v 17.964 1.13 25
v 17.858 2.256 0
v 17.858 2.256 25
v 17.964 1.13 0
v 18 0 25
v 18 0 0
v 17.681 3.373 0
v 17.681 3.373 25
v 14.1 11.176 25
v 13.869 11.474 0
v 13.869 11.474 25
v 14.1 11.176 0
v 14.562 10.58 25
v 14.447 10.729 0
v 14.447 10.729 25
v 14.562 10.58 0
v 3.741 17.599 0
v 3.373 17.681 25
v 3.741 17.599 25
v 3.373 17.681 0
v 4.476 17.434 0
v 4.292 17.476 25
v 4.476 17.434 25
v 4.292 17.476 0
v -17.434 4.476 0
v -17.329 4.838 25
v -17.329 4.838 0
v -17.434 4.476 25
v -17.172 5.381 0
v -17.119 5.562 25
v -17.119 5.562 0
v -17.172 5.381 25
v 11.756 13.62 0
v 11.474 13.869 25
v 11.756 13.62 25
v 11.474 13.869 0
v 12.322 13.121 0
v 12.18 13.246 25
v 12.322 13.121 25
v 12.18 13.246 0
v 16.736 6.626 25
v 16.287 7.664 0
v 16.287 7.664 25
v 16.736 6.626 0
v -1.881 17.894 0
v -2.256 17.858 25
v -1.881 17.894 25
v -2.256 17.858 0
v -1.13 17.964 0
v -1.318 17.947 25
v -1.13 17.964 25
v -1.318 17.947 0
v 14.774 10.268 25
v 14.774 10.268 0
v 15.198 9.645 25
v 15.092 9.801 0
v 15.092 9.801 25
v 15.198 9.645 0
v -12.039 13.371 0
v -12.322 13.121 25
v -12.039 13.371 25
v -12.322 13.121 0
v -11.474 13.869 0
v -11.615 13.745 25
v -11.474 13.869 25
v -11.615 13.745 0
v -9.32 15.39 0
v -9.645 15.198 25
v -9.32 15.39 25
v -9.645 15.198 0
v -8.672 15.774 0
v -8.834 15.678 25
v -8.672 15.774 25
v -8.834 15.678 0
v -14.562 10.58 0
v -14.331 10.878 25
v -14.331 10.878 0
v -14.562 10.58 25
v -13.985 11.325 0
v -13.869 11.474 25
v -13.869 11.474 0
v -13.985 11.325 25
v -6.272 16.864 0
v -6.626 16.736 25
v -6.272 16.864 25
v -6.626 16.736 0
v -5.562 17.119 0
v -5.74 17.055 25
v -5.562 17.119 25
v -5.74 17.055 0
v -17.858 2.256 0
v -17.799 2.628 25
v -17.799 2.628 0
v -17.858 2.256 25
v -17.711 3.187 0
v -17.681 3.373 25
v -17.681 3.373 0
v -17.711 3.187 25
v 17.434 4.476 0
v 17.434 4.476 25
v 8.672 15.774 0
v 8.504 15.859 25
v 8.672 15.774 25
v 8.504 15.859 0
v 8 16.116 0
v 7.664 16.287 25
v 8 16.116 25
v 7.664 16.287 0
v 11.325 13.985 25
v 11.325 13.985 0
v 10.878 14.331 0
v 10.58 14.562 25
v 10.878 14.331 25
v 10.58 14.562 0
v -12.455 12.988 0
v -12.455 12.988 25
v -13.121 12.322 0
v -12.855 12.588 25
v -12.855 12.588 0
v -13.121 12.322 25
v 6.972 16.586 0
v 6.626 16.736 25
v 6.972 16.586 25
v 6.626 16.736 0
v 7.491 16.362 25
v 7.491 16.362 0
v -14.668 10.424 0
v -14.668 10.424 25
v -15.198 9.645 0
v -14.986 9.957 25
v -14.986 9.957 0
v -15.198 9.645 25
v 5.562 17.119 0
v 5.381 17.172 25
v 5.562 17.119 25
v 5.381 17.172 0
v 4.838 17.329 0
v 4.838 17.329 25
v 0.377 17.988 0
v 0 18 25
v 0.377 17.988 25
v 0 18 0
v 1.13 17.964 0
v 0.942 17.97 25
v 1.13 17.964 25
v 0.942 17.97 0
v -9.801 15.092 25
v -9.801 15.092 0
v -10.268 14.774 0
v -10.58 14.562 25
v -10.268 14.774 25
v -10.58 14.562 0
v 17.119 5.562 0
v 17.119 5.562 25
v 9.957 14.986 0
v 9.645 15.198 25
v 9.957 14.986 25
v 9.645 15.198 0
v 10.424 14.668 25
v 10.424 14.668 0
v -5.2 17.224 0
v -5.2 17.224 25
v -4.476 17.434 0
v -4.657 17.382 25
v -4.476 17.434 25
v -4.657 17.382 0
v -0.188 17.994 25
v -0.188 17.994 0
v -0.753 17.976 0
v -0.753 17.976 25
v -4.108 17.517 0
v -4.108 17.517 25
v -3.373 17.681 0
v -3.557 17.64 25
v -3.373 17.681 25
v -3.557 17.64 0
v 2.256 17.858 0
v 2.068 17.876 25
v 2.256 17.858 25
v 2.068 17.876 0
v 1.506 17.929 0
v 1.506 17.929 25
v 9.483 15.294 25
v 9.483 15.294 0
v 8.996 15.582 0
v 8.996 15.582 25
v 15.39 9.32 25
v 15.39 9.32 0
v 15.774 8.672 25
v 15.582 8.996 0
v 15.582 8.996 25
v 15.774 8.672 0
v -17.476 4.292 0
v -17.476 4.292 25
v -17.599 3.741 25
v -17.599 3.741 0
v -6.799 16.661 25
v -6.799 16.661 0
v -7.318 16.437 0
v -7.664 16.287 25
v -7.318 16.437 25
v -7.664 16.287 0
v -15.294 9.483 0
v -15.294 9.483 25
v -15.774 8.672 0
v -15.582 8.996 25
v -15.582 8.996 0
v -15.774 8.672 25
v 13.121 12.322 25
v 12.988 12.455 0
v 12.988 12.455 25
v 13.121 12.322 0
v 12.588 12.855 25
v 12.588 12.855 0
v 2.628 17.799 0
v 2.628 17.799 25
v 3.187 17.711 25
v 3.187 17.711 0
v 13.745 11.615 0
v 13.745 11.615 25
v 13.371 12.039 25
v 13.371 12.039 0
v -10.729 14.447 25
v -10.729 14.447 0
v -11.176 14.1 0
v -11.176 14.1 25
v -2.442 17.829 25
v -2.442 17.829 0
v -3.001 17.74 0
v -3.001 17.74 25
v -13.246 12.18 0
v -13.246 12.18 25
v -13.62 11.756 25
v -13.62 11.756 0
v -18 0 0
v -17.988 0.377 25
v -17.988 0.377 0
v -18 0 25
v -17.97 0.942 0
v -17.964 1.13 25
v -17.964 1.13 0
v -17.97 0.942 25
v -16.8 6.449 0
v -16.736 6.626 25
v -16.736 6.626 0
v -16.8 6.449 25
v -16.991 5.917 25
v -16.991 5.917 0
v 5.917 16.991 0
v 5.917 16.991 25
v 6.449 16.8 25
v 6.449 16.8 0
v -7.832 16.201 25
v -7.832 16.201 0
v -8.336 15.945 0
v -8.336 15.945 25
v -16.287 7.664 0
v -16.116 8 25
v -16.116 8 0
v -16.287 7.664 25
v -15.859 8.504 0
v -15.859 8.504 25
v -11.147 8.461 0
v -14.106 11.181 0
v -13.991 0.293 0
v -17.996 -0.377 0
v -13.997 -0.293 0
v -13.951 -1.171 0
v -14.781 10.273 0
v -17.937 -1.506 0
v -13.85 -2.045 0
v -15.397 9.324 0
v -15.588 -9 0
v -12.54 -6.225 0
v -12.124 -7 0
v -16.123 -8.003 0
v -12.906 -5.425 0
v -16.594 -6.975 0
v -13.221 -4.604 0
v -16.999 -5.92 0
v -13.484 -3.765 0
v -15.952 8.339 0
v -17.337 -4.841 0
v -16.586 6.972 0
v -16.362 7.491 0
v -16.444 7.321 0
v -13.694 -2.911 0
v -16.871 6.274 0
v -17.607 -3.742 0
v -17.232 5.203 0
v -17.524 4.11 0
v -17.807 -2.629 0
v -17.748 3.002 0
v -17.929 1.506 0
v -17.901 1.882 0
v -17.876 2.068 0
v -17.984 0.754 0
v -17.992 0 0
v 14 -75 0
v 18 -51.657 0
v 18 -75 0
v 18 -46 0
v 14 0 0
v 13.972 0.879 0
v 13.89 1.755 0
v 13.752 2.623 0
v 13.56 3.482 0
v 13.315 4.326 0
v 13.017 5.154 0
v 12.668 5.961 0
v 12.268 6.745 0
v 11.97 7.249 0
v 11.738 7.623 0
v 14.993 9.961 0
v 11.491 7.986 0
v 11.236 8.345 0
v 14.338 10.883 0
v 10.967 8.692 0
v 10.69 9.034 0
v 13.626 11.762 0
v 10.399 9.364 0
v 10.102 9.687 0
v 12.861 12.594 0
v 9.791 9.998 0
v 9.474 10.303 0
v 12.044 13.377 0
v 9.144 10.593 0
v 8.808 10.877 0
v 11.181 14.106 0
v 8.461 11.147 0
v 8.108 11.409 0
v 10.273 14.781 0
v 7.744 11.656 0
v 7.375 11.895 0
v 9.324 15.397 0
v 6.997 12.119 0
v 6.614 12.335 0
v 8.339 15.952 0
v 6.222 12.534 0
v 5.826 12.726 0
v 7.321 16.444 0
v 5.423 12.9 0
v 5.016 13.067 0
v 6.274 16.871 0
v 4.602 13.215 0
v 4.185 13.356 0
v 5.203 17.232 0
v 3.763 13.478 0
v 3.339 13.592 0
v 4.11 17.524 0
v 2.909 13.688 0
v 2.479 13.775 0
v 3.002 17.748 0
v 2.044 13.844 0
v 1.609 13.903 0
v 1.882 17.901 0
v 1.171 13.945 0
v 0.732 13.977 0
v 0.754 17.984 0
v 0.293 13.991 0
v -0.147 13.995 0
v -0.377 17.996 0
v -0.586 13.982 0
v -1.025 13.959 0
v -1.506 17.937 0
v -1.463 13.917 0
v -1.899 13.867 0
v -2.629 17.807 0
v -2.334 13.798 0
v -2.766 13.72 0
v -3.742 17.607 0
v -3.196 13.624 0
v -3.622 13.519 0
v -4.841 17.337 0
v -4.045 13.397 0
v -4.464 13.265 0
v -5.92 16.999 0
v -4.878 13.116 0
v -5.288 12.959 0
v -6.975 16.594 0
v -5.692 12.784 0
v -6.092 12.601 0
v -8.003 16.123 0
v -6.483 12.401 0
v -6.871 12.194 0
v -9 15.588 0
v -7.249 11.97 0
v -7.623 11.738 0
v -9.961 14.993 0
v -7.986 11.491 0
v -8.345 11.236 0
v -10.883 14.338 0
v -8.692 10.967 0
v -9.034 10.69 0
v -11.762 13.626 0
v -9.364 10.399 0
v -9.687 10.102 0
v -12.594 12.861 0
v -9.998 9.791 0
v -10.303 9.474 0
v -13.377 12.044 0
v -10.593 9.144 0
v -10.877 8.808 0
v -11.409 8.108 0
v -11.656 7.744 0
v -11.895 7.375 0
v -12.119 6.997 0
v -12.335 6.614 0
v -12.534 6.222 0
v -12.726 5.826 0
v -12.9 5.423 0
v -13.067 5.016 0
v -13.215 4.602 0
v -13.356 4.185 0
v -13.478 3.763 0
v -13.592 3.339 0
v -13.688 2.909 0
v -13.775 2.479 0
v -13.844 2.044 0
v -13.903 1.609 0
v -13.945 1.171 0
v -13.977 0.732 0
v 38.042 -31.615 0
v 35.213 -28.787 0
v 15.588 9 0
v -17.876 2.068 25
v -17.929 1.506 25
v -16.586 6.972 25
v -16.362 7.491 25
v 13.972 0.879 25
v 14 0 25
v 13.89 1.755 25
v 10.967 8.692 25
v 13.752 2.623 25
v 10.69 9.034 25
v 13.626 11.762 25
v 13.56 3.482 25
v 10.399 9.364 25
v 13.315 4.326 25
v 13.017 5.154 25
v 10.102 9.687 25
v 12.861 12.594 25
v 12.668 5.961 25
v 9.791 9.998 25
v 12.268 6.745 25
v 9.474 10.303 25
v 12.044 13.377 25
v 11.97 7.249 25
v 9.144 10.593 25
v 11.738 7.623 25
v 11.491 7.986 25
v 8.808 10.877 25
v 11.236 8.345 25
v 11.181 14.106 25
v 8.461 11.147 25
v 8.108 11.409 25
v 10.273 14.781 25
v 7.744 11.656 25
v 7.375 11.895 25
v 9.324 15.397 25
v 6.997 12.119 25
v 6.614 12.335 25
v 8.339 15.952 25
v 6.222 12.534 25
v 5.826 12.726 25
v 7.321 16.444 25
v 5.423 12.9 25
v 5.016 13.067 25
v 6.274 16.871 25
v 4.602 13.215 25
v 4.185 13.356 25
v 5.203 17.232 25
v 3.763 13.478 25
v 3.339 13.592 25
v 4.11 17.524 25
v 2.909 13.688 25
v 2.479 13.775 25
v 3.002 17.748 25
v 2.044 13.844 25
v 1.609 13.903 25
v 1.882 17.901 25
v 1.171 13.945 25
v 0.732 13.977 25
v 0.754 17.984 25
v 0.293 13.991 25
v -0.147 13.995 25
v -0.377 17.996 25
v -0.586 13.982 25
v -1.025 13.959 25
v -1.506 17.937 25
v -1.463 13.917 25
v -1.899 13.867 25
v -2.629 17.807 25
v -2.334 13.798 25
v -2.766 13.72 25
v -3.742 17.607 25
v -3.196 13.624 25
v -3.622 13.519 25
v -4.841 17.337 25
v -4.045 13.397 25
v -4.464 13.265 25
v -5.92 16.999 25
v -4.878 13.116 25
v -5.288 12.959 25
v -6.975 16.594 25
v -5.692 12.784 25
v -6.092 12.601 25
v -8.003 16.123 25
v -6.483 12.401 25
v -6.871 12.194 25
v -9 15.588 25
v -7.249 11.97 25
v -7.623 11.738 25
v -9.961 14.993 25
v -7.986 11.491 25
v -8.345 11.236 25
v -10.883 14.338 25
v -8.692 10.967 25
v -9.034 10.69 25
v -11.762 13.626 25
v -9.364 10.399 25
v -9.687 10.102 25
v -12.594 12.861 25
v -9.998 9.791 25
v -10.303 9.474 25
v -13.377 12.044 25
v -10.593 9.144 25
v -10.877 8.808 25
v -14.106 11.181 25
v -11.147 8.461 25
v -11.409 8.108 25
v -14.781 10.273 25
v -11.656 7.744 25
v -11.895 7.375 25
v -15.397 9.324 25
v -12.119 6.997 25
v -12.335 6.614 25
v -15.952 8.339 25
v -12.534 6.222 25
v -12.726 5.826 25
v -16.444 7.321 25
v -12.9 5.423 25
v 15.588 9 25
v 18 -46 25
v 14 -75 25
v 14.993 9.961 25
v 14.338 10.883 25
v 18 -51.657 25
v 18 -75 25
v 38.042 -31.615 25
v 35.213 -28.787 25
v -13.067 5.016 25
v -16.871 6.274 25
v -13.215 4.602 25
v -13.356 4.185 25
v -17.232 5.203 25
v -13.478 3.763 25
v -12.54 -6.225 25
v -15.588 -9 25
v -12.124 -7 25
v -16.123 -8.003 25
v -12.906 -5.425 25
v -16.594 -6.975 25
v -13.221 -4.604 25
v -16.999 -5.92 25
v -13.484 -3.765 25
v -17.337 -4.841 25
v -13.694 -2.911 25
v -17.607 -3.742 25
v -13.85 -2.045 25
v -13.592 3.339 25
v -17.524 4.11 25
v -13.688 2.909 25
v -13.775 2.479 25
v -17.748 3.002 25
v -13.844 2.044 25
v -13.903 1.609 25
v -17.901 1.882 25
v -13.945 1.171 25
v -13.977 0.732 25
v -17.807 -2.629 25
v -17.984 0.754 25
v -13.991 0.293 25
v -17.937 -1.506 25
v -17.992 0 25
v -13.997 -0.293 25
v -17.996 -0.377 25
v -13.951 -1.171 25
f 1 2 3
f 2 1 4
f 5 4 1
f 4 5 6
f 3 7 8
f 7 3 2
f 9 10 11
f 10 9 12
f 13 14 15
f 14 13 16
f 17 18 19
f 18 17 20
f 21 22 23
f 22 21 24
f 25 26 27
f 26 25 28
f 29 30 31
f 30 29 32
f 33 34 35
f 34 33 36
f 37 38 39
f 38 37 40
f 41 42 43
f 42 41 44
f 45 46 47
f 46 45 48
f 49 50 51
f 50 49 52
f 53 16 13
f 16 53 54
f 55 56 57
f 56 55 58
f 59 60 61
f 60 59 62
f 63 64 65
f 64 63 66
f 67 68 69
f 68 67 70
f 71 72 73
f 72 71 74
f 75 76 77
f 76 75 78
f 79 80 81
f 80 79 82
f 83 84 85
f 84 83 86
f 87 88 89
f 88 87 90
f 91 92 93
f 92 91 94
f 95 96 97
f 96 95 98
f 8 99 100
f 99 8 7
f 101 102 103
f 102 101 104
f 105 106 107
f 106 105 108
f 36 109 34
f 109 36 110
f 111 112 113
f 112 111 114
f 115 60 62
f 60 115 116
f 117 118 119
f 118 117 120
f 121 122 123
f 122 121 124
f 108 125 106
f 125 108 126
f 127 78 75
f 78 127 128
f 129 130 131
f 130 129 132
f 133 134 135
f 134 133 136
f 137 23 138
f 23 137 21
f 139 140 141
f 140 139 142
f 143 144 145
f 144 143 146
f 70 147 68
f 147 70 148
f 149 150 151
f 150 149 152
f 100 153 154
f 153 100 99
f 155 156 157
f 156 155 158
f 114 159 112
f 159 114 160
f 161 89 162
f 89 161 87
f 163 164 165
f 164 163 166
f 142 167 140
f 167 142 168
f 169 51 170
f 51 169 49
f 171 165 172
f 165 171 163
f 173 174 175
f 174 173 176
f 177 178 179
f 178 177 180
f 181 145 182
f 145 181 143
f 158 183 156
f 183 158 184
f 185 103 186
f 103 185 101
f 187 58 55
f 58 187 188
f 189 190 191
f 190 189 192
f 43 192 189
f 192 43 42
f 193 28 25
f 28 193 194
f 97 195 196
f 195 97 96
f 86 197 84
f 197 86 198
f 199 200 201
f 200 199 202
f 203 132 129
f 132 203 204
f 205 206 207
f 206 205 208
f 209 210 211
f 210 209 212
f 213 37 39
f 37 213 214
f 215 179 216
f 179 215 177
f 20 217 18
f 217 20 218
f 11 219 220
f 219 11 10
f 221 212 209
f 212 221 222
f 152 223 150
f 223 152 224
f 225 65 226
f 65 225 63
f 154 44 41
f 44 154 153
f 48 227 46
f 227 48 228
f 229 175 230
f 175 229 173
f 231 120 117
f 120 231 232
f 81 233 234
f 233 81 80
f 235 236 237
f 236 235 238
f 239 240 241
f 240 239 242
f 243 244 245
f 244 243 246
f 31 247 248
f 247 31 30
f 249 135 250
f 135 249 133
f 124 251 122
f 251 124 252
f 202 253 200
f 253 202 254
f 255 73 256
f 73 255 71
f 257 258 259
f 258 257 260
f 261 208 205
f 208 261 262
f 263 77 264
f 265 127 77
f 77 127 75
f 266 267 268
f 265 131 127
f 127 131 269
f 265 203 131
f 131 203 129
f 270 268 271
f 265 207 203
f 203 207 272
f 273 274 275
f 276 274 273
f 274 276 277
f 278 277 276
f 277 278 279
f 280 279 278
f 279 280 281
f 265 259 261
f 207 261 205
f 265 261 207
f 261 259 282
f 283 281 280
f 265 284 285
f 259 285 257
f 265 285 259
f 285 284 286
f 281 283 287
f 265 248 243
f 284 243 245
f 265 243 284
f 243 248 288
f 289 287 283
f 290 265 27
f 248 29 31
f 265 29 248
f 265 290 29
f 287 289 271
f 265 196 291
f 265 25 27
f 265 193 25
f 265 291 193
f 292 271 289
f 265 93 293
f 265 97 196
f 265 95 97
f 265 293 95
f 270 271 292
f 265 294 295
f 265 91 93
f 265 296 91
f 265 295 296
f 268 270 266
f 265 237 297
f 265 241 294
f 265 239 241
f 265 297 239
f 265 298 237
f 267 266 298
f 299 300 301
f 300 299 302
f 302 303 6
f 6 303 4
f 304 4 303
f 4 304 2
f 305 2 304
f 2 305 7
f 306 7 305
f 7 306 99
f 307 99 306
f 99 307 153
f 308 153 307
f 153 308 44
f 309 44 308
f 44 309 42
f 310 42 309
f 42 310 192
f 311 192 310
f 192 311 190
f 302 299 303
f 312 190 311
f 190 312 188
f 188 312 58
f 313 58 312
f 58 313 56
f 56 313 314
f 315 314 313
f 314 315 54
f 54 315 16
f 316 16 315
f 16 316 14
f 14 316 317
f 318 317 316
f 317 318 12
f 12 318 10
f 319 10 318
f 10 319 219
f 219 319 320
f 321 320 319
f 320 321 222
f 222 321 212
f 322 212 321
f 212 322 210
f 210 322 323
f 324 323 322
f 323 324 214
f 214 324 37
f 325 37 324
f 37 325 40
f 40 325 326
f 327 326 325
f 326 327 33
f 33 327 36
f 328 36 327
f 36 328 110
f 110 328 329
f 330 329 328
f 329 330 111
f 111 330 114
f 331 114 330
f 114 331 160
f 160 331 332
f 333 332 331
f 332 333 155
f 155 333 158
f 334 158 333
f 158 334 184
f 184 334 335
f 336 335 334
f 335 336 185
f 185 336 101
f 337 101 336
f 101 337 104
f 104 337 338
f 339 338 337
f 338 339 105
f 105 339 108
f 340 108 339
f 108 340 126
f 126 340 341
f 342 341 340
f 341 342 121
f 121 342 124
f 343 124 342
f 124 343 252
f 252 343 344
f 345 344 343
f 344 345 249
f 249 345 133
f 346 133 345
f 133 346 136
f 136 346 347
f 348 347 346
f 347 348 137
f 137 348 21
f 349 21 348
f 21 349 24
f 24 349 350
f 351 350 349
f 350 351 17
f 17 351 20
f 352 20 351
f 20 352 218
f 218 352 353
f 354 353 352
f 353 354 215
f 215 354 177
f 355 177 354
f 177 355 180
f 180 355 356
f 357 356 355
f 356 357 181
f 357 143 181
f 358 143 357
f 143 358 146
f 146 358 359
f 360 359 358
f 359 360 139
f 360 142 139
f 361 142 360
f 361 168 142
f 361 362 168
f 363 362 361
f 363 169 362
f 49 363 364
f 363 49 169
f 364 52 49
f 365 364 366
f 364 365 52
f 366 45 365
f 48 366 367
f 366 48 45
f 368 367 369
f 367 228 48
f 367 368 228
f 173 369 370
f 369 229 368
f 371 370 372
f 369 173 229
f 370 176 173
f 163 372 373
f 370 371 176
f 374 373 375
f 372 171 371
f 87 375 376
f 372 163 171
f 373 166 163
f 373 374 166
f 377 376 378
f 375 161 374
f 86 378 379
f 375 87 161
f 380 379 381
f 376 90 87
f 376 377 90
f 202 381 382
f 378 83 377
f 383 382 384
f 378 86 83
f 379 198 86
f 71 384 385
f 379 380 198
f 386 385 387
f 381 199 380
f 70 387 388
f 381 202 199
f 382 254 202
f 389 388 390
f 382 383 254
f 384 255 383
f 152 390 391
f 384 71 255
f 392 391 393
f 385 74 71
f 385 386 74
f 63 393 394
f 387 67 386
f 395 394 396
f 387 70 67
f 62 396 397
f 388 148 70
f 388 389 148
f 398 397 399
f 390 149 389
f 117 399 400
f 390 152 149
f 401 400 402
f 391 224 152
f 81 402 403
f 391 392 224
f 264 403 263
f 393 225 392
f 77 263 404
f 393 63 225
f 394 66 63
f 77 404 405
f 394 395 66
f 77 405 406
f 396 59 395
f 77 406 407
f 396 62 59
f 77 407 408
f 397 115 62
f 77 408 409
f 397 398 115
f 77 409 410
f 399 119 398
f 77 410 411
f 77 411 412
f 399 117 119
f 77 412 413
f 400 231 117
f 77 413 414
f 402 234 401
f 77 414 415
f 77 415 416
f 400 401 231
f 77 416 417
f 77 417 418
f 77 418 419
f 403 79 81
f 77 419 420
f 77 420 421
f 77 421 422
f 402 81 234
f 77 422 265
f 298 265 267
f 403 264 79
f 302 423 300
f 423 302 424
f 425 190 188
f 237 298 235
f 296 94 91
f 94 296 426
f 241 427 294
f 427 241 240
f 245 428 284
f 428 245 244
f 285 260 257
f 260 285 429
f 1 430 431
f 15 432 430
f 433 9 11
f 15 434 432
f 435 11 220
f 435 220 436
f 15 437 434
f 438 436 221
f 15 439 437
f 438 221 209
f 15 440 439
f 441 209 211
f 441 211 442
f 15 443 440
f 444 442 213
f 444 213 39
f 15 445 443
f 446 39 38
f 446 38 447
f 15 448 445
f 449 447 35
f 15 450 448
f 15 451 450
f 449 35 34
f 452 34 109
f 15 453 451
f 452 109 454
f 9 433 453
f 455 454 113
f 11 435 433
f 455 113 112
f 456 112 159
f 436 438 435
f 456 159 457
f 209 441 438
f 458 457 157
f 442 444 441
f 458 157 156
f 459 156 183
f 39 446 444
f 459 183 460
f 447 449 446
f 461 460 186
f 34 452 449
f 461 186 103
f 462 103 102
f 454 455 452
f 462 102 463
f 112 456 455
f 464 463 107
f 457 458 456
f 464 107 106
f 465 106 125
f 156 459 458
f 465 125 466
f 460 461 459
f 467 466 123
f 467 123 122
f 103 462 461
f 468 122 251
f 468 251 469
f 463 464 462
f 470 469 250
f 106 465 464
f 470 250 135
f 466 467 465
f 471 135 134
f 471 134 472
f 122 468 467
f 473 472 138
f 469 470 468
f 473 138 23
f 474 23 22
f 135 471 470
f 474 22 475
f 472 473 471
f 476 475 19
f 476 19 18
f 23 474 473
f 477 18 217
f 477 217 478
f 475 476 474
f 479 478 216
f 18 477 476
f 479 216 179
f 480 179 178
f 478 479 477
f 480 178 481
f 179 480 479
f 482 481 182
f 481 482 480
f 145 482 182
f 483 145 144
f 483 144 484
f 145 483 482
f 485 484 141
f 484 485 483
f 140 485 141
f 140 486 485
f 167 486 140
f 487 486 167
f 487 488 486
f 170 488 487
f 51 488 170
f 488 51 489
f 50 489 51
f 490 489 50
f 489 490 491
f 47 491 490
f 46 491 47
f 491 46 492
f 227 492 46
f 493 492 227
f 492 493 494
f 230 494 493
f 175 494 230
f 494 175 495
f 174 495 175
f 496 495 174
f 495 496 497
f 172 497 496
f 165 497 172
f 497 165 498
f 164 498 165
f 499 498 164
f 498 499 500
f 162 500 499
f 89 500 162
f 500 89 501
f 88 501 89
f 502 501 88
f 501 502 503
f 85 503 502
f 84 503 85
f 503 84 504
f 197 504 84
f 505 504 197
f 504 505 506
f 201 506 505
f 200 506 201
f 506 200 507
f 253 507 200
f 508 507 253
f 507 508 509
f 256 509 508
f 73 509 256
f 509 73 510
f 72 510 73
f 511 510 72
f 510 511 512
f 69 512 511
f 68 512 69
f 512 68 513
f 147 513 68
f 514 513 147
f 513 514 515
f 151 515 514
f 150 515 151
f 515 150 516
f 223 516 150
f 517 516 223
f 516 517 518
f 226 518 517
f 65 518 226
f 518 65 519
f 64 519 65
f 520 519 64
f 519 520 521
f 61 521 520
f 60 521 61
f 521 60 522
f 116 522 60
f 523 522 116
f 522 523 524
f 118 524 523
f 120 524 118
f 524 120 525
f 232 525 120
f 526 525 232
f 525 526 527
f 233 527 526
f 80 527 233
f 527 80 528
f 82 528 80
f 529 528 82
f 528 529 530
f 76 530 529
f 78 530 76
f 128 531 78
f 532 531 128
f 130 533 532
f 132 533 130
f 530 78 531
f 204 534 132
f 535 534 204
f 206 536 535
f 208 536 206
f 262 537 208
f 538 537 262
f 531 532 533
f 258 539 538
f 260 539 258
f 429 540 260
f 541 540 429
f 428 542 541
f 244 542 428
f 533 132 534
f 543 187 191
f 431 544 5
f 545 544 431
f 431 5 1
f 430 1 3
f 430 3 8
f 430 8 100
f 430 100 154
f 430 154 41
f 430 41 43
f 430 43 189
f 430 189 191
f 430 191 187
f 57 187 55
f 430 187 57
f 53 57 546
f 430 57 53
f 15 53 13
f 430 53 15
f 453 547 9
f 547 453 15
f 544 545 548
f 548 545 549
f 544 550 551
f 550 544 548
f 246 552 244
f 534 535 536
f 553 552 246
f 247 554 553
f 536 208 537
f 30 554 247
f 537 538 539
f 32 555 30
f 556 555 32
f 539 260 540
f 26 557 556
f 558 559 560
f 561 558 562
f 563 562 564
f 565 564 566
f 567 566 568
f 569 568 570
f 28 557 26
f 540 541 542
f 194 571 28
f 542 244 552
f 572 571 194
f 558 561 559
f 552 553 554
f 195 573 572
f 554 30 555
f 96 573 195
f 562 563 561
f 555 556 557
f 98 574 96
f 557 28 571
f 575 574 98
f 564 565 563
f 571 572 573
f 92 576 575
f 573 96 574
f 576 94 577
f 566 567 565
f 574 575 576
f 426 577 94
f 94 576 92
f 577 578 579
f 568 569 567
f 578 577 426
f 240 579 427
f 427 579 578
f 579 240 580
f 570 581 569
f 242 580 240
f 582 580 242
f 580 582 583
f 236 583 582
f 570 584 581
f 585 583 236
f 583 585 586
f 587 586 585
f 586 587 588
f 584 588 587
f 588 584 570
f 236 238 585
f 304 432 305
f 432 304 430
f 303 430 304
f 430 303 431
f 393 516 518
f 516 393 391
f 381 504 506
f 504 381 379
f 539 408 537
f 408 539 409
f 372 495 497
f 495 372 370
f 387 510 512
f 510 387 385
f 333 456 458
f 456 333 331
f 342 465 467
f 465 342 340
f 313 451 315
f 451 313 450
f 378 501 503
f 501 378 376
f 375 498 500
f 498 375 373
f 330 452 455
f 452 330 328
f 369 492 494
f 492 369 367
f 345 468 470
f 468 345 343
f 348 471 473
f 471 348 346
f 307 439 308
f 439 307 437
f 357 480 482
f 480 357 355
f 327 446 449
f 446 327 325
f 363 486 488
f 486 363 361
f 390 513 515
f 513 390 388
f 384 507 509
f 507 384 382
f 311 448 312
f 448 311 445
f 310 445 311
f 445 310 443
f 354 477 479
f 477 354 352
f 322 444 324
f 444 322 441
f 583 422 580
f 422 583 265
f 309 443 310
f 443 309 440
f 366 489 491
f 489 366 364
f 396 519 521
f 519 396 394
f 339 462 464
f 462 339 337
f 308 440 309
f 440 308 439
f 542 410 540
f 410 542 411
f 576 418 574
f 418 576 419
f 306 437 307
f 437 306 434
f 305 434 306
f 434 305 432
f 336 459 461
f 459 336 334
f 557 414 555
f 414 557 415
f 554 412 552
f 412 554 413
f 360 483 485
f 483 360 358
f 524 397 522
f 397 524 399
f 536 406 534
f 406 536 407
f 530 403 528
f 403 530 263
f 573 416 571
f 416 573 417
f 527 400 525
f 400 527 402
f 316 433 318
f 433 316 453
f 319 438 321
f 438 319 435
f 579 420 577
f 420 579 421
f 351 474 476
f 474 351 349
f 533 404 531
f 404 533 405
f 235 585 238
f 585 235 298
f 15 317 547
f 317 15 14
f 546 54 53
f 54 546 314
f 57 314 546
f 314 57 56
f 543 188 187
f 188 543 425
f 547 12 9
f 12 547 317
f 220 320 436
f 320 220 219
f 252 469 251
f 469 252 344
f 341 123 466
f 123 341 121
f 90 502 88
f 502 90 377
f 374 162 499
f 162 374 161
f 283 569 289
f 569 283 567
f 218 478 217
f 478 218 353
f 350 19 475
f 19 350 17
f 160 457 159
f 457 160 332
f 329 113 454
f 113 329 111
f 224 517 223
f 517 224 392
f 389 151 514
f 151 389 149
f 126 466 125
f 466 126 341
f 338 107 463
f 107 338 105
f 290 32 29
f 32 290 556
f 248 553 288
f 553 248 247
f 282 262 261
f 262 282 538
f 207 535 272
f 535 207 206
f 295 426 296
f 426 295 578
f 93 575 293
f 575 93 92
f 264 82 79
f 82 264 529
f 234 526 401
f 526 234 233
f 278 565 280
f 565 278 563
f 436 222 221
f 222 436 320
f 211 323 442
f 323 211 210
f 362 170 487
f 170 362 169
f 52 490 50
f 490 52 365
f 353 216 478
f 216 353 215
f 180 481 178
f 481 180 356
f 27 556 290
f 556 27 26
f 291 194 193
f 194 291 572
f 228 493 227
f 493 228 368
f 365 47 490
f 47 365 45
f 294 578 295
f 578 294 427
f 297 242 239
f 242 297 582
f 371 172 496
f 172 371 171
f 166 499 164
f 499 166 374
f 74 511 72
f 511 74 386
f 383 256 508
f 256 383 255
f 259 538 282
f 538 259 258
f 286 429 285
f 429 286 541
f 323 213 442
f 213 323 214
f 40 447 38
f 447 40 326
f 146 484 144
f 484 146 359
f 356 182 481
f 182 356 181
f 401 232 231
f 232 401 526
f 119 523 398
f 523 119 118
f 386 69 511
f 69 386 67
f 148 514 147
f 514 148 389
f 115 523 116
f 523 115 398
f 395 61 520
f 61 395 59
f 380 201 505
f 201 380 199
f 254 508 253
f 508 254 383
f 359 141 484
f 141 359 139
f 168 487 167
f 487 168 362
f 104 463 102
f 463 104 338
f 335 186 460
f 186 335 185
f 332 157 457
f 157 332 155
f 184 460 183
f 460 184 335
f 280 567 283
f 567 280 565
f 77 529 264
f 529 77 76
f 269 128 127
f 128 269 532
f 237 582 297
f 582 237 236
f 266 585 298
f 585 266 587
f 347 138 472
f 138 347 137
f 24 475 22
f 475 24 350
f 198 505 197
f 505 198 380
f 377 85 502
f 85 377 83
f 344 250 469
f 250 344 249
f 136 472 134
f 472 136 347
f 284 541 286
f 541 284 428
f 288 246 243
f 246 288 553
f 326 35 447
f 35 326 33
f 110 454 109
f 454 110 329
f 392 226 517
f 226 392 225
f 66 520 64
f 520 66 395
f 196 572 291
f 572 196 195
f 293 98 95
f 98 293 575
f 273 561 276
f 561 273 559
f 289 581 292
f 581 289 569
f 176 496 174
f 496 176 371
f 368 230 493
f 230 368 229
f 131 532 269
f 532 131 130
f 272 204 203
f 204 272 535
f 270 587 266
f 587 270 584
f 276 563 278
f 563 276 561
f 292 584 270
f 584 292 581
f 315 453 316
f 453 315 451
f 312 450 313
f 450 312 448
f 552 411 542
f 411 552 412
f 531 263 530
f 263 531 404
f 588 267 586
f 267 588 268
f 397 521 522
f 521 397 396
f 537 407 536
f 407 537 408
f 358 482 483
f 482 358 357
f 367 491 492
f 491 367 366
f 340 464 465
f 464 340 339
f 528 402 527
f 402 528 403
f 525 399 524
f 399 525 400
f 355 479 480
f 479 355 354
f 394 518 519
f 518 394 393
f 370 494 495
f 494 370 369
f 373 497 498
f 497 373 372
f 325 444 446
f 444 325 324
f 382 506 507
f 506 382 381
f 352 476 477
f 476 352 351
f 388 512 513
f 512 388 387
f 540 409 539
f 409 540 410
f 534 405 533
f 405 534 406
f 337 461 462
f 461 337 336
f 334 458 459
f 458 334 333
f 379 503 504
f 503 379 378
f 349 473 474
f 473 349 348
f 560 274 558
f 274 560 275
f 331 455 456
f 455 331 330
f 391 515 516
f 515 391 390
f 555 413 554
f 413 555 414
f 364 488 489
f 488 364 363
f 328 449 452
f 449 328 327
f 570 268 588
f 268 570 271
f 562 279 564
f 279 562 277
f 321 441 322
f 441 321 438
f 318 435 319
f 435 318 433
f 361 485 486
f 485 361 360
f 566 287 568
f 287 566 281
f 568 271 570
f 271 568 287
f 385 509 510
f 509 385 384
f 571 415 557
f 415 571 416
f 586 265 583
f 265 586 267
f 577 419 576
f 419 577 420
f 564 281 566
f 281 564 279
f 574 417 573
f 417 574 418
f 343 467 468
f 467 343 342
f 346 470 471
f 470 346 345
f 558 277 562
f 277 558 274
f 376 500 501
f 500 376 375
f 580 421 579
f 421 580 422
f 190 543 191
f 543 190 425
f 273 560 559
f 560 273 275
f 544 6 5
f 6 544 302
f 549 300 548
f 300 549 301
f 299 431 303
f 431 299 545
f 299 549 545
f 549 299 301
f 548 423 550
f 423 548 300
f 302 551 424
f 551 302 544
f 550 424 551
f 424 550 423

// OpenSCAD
Thickness = 4;
TubeRadius = 14;
Depth = 25;

ArcInclinationDegree = 30;
HookInclinationDegree = 45;

LayingFaceHeight = 75;

UseSmoothing = false;

module Arc() {
    intersection(){
        difference() {
            cylinder(h = Depth, r=TubeRadius + Thickness);
            translate([0, 0, -1]){
                cylinder(h = Depth + 2, r=TubeRadius);
            }
        }
        
        translate([-Depth, 0, 0]){
            cube(2*Depth);
        } 
    }
}

module InitialModel() {
    union() {
        Arc();
        
        rotate([0, 0, ArcInclinationDegree]) {
            Arc();
        }
        
        translate([TubeRadius, -LayingFaceHeight, 0]) {
            cube([Thickness, LayingFaceHeight, Depth]);        
        }
        
        translate([TubeRadius, -LayingFaceHeight/1.5, 0]) {
            rotate([0, 0, -HookInclinationDegree]) {
                cube([Thickness, LayingFaceHeight/2.5, Depth]);        
            }
        }
        
    }
    
}

if(UseSmoothing) {
    $fn = 10;
    minkowski() {
        InitialModel();
        sphere(1);
    }
}
else
{
    $fn = 100;
    InitialModel();
}
